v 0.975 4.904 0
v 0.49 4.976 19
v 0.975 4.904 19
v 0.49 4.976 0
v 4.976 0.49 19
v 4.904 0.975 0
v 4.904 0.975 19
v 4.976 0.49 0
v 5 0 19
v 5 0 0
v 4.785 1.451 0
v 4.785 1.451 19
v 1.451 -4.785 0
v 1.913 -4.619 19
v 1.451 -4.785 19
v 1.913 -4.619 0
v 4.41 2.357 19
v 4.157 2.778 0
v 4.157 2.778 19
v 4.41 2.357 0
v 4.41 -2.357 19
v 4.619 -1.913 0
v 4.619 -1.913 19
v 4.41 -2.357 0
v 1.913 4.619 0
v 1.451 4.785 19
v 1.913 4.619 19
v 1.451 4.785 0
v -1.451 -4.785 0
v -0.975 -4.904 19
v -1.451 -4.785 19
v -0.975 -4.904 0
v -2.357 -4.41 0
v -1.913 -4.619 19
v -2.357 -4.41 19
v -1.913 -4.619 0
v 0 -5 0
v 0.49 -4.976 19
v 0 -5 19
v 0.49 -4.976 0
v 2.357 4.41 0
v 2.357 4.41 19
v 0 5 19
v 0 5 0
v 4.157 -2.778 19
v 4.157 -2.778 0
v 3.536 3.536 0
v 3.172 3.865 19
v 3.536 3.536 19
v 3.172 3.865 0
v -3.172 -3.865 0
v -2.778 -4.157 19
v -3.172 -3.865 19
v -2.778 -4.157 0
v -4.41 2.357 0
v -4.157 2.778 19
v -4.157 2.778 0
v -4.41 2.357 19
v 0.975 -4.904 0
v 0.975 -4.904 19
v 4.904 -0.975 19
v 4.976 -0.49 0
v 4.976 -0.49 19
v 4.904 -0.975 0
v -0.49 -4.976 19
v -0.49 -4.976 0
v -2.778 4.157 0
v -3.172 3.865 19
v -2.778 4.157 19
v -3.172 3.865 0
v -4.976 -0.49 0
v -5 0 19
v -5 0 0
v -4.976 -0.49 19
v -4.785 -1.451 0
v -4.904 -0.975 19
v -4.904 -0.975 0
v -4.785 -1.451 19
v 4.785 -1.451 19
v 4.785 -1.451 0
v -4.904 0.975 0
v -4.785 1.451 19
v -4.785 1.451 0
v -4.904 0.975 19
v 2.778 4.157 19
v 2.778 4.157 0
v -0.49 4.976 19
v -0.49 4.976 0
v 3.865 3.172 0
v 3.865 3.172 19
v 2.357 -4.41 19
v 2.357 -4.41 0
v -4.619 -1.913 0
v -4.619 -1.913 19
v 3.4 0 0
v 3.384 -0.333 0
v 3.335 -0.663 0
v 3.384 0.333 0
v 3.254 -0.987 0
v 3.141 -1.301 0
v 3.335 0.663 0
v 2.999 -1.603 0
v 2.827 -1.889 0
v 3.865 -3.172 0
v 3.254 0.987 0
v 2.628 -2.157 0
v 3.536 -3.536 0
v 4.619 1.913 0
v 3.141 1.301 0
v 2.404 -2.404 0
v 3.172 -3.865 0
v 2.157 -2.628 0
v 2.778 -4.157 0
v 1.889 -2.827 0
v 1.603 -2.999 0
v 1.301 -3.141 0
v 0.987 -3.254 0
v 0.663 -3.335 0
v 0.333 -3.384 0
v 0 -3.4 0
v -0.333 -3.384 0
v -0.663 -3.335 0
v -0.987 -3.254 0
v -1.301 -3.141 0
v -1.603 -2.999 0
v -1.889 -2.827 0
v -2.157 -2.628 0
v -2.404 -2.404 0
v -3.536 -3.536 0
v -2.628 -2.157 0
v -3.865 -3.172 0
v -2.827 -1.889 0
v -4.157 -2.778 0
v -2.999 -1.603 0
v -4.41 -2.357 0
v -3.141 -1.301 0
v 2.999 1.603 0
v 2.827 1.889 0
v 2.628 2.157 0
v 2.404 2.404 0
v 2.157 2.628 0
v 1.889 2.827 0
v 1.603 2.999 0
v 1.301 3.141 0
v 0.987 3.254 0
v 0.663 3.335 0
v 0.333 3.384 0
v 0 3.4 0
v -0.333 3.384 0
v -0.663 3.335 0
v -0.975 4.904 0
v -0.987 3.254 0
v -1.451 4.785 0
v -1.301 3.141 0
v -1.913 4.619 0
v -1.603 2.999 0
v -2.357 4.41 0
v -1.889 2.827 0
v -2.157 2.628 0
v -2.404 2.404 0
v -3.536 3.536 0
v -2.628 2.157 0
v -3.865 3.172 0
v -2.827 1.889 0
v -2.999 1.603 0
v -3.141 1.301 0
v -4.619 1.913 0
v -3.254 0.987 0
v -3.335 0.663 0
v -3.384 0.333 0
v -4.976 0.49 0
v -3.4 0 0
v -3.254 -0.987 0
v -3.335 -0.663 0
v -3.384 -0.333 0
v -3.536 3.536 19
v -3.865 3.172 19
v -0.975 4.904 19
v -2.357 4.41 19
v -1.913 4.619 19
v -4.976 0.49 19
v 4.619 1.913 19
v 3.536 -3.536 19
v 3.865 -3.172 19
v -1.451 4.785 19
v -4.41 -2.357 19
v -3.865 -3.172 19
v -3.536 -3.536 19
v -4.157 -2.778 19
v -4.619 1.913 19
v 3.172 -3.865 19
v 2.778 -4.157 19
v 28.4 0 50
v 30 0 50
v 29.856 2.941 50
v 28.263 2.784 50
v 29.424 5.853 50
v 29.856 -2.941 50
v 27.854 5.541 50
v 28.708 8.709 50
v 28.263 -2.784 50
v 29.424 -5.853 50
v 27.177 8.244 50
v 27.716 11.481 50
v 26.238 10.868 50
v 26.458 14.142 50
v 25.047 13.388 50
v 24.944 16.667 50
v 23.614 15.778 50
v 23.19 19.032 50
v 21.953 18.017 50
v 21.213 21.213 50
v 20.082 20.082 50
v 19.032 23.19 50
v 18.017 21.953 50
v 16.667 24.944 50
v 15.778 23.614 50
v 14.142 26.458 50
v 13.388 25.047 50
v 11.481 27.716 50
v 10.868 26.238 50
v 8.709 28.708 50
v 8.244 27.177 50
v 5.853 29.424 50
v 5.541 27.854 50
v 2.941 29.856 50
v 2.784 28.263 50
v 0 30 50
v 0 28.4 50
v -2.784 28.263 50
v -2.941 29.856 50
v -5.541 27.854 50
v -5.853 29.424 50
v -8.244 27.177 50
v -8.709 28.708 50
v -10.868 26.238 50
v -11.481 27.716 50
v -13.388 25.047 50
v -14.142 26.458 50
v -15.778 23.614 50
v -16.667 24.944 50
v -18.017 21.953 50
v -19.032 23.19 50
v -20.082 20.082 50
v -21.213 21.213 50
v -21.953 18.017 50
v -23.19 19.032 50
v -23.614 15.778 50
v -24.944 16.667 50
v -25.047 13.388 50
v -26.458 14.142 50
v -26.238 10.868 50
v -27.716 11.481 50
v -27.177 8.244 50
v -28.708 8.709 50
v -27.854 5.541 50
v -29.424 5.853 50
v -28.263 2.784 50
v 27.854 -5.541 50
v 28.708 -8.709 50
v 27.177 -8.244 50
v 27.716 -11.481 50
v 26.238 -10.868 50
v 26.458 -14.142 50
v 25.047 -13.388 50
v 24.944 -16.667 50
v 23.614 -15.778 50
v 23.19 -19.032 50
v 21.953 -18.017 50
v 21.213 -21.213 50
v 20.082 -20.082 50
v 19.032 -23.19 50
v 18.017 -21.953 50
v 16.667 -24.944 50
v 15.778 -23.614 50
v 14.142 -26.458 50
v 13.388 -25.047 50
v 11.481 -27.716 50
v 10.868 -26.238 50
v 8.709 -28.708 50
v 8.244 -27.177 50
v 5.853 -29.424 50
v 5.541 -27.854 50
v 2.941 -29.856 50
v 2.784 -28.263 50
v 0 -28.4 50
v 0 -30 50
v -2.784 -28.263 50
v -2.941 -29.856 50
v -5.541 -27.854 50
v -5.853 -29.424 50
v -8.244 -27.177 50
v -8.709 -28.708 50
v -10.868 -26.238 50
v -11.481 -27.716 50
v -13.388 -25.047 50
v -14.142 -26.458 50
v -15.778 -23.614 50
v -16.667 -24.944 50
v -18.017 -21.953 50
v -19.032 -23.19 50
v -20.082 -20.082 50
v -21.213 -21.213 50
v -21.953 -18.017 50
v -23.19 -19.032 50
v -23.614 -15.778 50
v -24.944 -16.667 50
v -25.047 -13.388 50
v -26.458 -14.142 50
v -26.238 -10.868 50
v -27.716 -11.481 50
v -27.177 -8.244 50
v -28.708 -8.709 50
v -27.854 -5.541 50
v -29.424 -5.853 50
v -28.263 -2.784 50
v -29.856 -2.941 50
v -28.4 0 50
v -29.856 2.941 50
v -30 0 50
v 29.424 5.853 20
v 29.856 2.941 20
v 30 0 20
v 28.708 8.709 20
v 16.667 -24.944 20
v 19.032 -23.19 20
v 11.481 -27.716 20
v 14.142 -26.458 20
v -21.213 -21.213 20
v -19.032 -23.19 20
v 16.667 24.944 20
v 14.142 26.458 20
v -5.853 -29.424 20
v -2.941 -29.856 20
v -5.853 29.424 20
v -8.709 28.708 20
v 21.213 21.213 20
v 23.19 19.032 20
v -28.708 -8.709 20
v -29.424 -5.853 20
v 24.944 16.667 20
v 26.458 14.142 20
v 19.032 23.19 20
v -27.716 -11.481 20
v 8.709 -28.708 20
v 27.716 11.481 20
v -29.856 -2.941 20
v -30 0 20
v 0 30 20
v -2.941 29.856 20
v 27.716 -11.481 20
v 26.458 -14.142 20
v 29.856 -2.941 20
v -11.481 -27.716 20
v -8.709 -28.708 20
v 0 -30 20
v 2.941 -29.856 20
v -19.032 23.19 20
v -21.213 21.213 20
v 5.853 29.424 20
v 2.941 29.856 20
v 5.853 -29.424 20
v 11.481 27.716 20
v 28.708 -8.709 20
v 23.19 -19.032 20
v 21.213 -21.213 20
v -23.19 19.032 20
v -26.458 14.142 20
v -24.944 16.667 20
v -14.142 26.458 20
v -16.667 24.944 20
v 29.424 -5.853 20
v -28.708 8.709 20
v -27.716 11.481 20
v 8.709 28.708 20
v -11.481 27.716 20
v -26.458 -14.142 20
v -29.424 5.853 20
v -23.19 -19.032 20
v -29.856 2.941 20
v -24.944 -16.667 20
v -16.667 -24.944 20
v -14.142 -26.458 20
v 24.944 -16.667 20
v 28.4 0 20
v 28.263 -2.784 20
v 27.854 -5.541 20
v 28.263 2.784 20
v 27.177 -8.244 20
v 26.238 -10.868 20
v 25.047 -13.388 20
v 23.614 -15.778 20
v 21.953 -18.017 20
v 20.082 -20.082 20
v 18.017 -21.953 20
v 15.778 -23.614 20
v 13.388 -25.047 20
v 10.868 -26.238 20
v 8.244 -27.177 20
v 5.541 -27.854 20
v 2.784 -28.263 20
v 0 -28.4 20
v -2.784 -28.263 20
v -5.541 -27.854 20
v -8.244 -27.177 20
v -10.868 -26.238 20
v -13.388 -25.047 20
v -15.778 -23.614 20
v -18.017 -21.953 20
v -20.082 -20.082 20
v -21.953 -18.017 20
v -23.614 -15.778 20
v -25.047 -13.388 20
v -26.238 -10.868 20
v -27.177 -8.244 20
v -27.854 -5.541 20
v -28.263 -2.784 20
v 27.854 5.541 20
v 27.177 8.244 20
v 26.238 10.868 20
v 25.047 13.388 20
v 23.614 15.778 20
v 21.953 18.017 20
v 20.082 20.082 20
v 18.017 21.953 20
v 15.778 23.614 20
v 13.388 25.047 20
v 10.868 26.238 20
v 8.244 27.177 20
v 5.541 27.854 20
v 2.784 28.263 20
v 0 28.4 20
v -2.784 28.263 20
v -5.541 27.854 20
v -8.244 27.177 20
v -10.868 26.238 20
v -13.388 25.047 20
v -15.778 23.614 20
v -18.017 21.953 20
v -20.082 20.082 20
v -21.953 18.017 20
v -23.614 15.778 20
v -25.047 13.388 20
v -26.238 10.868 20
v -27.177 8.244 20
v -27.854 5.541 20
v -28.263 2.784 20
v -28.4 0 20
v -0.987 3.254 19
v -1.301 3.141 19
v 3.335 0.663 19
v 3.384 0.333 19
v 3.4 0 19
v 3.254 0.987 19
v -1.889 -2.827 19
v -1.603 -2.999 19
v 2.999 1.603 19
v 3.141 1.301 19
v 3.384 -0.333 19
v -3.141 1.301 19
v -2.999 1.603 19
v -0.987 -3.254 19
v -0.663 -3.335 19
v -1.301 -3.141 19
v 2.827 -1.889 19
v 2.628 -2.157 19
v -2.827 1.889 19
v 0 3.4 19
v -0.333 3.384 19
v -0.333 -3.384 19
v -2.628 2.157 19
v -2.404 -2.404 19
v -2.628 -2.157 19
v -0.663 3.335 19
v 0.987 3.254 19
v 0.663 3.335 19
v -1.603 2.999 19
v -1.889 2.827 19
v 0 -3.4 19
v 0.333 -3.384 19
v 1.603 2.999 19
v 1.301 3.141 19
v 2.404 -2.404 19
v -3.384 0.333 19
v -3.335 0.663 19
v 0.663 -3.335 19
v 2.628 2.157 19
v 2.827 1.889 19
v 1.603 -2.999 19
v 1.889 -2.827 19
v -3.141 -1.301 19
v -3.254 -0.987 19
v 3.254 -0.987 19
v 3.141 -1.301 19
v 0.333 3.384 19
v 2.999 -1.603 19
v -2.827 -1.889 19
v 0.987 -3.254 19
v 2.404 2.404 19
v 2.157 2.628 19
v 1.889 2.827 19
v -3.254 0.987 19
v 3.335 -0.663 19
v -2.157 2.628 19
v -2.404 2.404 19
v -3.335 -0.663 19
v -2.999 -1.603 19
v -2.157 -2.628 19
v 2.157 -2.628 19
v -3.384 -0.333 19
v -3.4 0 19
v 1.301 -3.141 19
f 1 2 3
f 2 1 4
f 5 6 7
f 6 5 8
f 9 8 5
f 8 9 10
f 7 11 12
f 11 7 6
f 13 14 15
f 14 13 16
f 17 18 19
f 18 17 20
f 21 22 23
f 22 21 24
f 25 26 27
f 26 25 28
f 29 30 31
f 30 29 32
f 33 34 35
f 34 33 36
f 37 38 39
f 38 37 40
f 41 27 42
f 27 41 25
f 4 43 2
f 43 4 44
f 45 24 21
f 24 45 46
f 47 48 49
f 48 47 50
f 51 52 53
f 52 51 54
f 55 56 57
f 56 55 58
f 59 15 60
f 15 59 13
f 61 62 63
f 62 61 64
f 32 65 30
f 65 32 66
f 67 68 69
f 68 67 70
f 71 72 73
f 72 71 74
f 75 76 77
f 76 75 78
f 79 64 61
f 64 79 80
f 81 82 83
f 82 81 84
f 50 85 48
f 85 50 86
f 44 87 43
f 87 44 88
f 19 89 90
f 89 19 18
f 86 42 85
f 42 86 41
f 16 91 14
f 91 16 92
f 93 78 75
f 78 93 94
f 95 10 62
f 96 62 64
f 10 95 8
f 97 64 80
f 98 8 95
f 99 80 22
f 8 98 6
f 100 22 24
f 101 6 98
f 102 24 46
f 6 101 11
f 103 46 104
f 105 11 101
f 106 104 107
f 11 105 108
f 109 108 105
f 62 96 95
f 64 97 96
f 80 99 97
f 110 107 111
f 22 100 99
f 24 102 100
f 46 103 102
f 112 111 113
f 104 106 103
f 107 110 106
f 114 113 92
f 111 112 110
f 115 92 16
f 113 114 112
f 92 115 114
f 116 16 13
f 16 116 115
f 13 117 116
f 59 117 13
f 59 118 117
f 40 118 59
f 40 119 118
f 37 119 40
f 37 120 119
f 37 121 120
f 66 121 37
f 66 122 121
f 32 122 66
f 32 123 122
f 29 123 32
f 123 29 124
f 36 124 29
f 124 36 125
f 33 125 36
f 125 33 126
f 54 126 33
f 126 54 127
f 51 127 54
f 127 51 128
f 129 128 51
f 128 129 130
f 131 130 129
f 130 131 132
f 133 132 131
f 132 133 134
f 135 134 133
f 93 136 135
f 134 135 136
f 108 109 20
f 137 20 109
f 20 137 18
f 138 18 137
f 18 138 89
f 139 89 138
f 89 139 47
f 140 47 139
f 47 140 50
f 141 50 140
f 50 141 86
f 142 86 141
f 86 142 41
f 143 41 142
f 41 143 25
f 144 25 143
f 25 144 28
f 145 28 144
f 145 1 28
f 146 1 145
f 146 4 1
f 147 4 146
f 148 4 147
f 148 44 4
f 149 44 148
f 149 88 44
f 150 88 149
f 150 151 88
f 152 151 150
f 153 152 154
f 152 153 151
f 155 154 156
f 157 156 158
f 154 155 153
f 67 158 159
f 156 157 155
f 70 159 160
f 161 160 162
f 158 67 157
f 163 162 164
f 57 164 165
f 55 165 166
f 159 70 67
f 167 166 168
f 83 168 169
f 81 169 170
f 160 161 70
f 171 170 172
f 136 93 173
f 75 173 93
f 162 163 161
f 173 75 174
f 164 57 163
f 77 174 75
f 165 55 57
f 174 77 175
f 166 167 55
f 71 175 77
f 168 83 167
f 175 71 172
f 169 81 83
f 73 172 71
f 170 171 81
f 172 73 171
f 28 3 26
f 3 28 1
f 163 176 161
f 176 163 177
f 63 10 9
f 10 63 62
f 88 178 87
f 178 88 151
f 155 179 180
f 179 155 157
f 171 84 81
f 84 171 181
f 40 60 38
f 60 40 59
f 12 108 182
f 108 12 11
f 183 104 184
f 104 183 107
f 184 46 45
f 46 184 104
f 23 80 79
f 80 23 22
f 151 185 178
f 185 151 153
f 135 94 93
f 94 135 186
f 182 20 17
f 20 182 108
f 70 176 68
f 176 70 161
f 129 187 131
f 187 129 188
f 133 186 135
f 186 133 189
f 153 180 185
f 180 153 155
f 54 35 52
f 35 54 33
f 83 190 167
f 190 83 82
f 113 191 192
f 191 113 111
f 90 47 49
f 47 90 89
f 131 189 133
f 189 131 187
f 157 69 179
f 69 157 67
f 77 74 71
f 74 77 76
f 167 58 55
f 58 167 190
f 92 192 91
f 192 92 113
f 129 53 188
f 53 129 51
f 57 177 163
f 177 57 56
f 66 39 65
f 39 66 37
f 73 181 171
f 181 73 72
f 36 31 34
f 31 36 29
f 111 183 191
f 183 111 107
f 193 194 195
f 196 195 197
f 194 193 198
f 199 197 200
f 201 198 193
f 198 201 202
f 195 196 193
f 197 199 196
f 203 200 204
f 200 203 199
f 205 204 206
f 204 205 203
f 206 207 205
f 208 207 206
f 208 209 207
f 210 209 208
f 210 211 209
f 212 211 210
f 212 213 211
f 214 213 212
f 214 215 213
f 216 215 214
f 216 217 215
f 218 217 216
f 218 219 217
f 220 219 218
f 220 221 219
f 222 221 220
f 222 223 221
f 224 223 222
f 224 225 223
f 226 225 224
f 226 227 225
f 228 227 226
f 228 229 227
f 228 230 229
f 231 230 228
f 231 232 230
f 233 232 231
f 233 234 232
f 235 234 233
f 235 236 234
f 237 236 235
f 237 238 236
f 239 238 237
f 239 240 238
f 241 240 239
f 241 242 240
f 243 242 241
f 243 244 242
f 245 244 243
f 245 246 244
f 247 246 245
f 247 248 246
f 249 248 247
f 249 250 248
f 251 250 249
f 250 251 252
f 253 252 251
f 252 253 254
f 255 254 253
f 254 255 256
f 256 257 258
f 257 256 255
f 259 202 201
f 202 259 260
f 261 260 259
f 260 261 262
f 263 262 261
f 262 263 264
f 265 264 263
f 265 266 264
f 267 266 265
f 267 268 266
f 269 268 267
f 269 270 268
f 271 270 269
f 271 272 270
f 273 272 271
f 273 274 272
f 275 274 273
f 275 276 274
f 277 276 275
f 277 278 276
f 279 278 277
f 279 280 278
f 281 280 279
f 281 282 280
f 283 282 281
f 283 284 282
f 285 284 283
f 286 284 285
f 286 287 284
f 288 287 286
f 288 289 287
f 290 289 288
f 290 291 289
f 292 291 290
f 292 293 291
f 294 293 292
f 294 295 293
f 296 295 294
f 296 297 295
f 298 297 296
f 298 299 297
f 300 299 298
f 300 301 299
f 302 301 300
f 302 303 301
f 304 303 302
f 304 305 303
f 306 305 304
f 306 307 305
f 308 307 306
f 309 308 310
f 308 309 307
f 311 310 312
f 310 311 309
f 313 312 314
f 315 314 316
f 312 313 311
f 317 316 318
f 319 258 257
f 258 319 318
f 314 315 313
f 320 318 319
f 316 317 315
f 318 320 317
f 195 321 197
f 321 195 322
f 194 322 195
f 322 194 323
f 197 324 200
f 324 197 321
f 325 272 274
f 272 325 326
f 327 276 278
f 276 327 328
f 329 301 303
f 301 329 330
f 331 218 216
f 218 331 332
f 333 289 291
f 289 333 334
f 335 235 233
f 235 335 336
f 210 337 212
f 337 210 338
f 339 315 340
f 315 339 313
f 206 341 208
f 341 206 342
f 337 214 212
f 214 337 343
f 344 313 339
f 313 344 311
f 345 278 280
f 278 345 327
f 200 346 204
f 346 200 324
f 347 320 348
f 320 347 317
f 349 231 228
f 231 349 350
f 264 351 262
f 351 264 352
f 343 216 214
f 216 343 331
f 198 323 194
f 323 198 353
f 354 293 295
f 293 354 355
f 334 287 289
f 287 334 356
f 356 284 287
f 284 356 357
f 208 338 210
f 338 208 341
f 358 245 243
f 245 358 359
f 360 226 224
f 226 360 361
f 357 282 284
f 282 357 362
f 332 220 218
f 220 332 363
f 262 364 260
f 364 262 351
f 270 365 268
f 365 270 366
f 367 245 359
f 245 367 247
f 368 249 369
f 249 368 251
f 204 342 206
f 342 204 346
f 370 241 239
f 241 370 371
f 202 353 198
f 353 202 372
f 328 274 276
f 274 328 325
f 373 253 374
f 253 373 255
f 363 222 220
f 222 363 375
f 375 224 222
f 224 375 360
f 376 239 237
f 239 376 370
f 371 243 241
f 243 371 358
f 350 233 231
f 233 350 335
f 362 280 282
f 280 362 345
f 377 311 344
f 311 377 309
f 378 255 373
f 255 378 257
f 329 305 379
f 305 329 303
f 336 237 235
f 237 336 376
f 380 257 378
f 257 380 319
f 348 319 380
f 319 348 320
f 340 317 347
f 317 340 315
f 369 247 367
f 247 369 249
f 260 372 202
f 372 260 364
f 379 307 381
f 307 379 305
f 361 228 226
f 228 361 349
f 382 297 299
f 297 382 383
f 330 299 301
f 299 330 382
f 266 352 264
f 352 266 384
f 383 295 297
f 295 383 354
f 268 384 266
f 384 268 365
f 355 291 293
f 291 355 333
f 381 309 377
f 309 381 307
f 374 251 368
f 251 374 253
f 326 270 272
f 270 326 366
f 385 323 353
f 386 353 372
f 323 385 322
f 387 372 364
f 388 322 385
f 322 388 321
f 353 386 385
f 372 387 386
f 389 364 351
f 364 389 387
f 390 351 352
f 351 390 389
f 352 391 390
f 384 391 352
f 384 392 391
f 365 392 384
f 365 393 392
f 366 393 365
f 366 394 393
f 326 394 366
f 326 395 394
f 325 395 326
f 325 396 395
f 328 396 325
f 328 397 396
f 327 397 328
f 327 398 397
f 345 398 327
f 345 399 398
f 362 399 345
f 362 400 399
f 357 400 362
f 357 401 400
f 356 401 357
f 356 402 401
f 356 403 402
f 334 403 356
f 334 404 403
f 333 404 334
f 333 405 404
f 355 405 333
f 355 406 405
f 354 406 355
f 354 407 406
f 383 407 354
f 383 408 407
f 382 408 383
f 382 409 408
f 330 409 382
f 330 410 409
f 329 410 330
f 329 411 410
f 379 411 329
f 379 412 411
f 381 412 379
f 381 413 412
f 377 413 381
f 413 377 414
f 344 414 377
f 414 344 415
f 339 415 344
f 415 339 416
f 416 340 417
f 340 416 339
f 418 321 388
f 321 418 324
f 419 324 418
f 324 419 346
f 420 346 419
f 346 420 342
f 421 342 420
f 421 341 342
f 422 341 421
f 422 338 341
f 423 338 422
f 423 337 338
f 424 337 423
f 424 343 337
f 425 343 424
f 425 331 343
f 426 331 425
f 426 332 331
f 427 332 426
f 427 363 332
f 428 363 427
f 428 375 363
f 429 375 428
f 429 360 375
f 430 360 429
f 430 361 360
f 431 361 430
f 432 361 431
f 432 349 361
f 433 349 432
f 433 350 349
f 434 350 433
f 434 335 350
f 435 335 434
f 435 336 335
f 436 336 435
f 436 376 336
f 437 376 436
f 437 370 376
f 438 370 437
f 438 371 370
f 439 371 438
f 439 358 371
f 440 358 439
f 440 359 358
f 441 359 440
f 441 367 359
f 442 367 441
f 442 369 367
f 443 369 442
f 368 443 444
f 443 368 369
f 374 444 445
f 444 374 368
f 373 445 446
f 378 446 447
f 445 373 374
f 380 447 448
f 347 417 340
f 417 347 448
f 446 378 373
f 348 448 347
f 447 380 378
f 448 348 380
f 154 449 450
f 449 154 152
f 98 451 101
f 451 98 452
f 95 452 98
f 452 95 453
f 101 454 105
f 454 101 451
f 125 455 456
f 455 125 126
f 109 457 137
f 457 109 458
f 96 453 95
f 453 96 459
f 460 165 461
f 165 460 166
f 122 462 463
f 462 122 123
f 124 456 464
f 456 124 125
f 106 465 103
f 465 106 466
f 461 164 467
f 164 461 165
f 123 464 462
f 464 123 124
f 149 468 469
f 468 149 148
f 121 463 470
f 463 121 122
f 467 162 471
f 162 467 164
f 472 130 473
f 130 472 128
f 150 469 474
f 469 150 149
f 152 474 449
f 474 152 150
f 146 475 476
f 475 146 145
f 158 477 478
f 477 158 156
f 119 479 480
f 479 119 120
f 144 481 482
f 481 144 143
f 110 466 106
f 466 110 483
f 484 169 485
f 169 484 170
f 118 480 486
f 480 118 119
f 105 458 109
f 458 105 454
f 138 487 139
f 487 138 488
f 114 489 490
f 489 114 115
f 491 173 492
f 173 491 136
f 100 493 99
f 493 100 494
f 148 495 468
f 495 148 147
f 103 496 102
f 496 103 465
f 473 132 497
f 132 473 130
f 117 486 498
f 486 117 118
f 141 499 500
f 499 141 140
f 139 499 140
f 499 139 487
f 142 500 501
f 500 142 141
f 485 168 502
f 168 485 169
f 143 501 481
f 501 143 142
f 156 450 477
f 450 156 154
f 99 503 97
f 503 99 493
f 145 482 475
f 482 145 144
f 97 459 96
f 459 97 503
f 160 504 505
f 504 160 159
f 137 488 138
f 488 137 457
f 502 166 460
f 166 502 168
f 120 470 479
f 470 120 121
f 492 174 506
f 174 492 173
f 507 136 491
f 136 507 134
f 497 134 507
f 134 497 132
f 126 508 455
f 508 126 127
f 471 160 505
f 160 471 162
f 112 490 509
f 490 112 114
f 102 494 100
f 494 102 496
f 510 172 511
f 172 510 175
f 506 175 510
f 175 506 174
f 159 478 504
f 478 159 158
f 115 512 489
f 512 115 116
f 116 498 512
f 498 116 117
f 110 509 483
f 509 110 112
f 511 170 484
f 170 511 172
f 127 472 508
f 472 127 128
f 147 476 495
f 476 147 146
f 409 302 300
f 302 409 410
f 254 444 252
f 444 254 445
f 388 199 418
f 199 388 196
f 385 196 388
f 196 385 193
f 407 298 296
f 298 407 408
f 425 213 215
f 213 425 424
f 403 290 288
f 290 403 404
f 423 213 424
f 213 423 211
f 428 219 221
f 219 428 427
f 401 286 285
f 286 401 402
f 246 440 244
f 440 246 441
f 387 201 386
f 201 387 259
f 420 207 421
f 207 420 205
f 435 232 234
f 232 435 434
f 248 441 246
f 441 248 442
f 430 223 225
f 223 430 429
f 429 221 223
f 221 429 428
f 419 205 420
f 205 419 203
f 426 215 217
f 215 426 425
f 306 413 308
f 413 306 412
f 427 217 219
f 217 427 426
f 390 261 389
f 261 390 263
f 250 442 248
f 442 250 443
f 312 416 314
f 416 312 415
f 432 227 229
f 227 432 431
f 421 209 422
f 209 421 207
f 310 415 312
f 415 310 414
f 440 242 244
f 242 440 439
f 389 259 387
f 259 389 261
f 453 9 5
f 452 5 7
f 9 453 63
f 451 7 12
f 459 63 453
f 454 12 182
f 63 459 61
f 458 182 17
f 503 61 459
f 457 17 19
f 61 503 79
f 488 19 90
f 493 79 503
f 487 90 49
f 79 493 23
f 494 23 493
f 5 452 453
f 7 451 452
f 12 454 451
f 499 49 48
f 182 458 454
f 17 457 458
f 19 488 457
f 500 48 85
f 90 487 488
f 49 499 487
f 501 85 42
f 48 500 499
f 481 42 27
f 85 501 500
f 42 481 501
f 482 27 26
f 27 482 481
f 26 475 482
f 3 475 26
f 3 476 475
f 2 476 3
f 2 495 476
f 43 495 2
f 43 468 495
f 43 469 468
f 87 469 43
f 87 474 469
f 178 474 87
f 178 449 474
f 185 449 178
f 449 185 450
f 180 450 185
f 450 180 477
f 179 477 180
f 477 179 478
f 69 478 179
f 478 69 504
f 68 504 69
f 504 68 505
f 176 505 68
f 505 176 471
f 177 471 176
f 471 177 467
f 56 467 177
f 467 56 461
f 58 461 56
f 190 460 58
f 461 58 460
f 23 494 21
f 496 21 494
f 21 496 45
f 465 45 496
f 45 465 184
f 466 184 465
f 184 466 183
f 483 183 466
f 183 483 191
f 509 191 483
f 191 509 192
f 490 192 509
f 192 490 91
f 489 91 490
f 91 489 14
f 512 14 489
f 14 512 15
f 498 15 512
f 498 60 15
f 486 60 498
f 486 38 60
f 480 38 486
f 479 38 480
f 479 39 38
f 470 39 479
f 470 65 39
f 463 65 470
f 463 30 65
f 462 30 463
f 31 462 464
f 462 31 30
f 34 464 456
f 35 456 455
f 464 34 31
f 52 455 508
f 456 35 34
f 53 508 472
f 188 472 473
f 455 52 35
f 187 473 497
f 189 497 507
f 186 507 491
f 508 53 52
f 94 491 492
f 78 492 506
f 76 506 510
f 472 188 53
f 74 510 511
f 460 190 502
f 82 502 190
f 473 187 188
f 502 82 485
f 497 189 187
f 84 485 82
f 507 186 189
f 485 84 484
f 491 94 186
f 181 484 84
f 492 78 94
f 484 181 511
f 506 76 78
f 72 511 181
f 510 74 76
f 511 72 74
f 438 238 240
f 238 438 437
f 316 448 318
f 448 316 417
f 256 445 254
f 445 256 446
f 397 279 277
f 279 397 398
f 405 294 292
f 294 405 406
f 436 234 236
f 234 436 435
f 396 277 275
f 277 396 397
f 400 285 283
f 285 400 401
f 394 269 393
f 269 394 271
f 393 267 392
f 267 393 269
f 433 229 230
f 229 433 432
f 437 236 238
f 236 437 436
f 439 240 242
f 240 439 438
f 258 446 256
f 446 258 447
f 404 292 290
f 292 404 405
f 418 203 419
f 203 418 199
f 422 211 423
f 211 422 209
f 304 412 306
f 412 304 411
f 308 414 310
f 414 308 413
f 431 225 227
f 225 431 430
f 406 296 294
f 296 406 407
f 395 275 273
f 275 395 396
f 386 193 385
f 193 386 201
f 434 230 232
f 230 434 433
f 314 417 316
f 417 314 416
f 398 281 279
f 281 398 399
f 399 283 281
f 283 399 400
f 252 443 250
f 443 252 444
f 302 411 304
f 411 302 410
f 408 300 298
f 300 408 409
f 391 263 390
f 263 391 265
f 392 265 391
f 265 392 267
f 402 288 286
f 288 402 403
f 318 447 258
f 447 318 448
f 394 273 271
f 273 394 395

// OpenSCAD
// Funnel - a straight spout (tube) topped by a conical section, open at both ends for fluid
// flow. NOVEL general part for a lab bench or a custom assembly.
//

spout_d = 10;
spout_l = 20;
cone_d  = 60;
wall    = 1.6;

$fn = 64;

ib = spout_d - 2 * wall;          // spout bore
ic = cone_d - 2 * wall;           // cone inner diameter at its narrow end

difference() {
    union() {
        cylinder(h = spout_l, d = spout_d);                 // spout
        translate([0, 0, spout_l]) cylinder(h = 30, d = spout_d);  // tube section of cone
        translate([0, 0, spout_l]) cylinder(h = 30, d = cone_d);  // conical section
    }
    translate([0, 0, -1]) cylinder(h = spout_l + 2, d = ib);                     // bore through spout
    translate([0, 0, spout_l - 1]) cylinder(h = 32, d = ic);                     // cone inner space
}
